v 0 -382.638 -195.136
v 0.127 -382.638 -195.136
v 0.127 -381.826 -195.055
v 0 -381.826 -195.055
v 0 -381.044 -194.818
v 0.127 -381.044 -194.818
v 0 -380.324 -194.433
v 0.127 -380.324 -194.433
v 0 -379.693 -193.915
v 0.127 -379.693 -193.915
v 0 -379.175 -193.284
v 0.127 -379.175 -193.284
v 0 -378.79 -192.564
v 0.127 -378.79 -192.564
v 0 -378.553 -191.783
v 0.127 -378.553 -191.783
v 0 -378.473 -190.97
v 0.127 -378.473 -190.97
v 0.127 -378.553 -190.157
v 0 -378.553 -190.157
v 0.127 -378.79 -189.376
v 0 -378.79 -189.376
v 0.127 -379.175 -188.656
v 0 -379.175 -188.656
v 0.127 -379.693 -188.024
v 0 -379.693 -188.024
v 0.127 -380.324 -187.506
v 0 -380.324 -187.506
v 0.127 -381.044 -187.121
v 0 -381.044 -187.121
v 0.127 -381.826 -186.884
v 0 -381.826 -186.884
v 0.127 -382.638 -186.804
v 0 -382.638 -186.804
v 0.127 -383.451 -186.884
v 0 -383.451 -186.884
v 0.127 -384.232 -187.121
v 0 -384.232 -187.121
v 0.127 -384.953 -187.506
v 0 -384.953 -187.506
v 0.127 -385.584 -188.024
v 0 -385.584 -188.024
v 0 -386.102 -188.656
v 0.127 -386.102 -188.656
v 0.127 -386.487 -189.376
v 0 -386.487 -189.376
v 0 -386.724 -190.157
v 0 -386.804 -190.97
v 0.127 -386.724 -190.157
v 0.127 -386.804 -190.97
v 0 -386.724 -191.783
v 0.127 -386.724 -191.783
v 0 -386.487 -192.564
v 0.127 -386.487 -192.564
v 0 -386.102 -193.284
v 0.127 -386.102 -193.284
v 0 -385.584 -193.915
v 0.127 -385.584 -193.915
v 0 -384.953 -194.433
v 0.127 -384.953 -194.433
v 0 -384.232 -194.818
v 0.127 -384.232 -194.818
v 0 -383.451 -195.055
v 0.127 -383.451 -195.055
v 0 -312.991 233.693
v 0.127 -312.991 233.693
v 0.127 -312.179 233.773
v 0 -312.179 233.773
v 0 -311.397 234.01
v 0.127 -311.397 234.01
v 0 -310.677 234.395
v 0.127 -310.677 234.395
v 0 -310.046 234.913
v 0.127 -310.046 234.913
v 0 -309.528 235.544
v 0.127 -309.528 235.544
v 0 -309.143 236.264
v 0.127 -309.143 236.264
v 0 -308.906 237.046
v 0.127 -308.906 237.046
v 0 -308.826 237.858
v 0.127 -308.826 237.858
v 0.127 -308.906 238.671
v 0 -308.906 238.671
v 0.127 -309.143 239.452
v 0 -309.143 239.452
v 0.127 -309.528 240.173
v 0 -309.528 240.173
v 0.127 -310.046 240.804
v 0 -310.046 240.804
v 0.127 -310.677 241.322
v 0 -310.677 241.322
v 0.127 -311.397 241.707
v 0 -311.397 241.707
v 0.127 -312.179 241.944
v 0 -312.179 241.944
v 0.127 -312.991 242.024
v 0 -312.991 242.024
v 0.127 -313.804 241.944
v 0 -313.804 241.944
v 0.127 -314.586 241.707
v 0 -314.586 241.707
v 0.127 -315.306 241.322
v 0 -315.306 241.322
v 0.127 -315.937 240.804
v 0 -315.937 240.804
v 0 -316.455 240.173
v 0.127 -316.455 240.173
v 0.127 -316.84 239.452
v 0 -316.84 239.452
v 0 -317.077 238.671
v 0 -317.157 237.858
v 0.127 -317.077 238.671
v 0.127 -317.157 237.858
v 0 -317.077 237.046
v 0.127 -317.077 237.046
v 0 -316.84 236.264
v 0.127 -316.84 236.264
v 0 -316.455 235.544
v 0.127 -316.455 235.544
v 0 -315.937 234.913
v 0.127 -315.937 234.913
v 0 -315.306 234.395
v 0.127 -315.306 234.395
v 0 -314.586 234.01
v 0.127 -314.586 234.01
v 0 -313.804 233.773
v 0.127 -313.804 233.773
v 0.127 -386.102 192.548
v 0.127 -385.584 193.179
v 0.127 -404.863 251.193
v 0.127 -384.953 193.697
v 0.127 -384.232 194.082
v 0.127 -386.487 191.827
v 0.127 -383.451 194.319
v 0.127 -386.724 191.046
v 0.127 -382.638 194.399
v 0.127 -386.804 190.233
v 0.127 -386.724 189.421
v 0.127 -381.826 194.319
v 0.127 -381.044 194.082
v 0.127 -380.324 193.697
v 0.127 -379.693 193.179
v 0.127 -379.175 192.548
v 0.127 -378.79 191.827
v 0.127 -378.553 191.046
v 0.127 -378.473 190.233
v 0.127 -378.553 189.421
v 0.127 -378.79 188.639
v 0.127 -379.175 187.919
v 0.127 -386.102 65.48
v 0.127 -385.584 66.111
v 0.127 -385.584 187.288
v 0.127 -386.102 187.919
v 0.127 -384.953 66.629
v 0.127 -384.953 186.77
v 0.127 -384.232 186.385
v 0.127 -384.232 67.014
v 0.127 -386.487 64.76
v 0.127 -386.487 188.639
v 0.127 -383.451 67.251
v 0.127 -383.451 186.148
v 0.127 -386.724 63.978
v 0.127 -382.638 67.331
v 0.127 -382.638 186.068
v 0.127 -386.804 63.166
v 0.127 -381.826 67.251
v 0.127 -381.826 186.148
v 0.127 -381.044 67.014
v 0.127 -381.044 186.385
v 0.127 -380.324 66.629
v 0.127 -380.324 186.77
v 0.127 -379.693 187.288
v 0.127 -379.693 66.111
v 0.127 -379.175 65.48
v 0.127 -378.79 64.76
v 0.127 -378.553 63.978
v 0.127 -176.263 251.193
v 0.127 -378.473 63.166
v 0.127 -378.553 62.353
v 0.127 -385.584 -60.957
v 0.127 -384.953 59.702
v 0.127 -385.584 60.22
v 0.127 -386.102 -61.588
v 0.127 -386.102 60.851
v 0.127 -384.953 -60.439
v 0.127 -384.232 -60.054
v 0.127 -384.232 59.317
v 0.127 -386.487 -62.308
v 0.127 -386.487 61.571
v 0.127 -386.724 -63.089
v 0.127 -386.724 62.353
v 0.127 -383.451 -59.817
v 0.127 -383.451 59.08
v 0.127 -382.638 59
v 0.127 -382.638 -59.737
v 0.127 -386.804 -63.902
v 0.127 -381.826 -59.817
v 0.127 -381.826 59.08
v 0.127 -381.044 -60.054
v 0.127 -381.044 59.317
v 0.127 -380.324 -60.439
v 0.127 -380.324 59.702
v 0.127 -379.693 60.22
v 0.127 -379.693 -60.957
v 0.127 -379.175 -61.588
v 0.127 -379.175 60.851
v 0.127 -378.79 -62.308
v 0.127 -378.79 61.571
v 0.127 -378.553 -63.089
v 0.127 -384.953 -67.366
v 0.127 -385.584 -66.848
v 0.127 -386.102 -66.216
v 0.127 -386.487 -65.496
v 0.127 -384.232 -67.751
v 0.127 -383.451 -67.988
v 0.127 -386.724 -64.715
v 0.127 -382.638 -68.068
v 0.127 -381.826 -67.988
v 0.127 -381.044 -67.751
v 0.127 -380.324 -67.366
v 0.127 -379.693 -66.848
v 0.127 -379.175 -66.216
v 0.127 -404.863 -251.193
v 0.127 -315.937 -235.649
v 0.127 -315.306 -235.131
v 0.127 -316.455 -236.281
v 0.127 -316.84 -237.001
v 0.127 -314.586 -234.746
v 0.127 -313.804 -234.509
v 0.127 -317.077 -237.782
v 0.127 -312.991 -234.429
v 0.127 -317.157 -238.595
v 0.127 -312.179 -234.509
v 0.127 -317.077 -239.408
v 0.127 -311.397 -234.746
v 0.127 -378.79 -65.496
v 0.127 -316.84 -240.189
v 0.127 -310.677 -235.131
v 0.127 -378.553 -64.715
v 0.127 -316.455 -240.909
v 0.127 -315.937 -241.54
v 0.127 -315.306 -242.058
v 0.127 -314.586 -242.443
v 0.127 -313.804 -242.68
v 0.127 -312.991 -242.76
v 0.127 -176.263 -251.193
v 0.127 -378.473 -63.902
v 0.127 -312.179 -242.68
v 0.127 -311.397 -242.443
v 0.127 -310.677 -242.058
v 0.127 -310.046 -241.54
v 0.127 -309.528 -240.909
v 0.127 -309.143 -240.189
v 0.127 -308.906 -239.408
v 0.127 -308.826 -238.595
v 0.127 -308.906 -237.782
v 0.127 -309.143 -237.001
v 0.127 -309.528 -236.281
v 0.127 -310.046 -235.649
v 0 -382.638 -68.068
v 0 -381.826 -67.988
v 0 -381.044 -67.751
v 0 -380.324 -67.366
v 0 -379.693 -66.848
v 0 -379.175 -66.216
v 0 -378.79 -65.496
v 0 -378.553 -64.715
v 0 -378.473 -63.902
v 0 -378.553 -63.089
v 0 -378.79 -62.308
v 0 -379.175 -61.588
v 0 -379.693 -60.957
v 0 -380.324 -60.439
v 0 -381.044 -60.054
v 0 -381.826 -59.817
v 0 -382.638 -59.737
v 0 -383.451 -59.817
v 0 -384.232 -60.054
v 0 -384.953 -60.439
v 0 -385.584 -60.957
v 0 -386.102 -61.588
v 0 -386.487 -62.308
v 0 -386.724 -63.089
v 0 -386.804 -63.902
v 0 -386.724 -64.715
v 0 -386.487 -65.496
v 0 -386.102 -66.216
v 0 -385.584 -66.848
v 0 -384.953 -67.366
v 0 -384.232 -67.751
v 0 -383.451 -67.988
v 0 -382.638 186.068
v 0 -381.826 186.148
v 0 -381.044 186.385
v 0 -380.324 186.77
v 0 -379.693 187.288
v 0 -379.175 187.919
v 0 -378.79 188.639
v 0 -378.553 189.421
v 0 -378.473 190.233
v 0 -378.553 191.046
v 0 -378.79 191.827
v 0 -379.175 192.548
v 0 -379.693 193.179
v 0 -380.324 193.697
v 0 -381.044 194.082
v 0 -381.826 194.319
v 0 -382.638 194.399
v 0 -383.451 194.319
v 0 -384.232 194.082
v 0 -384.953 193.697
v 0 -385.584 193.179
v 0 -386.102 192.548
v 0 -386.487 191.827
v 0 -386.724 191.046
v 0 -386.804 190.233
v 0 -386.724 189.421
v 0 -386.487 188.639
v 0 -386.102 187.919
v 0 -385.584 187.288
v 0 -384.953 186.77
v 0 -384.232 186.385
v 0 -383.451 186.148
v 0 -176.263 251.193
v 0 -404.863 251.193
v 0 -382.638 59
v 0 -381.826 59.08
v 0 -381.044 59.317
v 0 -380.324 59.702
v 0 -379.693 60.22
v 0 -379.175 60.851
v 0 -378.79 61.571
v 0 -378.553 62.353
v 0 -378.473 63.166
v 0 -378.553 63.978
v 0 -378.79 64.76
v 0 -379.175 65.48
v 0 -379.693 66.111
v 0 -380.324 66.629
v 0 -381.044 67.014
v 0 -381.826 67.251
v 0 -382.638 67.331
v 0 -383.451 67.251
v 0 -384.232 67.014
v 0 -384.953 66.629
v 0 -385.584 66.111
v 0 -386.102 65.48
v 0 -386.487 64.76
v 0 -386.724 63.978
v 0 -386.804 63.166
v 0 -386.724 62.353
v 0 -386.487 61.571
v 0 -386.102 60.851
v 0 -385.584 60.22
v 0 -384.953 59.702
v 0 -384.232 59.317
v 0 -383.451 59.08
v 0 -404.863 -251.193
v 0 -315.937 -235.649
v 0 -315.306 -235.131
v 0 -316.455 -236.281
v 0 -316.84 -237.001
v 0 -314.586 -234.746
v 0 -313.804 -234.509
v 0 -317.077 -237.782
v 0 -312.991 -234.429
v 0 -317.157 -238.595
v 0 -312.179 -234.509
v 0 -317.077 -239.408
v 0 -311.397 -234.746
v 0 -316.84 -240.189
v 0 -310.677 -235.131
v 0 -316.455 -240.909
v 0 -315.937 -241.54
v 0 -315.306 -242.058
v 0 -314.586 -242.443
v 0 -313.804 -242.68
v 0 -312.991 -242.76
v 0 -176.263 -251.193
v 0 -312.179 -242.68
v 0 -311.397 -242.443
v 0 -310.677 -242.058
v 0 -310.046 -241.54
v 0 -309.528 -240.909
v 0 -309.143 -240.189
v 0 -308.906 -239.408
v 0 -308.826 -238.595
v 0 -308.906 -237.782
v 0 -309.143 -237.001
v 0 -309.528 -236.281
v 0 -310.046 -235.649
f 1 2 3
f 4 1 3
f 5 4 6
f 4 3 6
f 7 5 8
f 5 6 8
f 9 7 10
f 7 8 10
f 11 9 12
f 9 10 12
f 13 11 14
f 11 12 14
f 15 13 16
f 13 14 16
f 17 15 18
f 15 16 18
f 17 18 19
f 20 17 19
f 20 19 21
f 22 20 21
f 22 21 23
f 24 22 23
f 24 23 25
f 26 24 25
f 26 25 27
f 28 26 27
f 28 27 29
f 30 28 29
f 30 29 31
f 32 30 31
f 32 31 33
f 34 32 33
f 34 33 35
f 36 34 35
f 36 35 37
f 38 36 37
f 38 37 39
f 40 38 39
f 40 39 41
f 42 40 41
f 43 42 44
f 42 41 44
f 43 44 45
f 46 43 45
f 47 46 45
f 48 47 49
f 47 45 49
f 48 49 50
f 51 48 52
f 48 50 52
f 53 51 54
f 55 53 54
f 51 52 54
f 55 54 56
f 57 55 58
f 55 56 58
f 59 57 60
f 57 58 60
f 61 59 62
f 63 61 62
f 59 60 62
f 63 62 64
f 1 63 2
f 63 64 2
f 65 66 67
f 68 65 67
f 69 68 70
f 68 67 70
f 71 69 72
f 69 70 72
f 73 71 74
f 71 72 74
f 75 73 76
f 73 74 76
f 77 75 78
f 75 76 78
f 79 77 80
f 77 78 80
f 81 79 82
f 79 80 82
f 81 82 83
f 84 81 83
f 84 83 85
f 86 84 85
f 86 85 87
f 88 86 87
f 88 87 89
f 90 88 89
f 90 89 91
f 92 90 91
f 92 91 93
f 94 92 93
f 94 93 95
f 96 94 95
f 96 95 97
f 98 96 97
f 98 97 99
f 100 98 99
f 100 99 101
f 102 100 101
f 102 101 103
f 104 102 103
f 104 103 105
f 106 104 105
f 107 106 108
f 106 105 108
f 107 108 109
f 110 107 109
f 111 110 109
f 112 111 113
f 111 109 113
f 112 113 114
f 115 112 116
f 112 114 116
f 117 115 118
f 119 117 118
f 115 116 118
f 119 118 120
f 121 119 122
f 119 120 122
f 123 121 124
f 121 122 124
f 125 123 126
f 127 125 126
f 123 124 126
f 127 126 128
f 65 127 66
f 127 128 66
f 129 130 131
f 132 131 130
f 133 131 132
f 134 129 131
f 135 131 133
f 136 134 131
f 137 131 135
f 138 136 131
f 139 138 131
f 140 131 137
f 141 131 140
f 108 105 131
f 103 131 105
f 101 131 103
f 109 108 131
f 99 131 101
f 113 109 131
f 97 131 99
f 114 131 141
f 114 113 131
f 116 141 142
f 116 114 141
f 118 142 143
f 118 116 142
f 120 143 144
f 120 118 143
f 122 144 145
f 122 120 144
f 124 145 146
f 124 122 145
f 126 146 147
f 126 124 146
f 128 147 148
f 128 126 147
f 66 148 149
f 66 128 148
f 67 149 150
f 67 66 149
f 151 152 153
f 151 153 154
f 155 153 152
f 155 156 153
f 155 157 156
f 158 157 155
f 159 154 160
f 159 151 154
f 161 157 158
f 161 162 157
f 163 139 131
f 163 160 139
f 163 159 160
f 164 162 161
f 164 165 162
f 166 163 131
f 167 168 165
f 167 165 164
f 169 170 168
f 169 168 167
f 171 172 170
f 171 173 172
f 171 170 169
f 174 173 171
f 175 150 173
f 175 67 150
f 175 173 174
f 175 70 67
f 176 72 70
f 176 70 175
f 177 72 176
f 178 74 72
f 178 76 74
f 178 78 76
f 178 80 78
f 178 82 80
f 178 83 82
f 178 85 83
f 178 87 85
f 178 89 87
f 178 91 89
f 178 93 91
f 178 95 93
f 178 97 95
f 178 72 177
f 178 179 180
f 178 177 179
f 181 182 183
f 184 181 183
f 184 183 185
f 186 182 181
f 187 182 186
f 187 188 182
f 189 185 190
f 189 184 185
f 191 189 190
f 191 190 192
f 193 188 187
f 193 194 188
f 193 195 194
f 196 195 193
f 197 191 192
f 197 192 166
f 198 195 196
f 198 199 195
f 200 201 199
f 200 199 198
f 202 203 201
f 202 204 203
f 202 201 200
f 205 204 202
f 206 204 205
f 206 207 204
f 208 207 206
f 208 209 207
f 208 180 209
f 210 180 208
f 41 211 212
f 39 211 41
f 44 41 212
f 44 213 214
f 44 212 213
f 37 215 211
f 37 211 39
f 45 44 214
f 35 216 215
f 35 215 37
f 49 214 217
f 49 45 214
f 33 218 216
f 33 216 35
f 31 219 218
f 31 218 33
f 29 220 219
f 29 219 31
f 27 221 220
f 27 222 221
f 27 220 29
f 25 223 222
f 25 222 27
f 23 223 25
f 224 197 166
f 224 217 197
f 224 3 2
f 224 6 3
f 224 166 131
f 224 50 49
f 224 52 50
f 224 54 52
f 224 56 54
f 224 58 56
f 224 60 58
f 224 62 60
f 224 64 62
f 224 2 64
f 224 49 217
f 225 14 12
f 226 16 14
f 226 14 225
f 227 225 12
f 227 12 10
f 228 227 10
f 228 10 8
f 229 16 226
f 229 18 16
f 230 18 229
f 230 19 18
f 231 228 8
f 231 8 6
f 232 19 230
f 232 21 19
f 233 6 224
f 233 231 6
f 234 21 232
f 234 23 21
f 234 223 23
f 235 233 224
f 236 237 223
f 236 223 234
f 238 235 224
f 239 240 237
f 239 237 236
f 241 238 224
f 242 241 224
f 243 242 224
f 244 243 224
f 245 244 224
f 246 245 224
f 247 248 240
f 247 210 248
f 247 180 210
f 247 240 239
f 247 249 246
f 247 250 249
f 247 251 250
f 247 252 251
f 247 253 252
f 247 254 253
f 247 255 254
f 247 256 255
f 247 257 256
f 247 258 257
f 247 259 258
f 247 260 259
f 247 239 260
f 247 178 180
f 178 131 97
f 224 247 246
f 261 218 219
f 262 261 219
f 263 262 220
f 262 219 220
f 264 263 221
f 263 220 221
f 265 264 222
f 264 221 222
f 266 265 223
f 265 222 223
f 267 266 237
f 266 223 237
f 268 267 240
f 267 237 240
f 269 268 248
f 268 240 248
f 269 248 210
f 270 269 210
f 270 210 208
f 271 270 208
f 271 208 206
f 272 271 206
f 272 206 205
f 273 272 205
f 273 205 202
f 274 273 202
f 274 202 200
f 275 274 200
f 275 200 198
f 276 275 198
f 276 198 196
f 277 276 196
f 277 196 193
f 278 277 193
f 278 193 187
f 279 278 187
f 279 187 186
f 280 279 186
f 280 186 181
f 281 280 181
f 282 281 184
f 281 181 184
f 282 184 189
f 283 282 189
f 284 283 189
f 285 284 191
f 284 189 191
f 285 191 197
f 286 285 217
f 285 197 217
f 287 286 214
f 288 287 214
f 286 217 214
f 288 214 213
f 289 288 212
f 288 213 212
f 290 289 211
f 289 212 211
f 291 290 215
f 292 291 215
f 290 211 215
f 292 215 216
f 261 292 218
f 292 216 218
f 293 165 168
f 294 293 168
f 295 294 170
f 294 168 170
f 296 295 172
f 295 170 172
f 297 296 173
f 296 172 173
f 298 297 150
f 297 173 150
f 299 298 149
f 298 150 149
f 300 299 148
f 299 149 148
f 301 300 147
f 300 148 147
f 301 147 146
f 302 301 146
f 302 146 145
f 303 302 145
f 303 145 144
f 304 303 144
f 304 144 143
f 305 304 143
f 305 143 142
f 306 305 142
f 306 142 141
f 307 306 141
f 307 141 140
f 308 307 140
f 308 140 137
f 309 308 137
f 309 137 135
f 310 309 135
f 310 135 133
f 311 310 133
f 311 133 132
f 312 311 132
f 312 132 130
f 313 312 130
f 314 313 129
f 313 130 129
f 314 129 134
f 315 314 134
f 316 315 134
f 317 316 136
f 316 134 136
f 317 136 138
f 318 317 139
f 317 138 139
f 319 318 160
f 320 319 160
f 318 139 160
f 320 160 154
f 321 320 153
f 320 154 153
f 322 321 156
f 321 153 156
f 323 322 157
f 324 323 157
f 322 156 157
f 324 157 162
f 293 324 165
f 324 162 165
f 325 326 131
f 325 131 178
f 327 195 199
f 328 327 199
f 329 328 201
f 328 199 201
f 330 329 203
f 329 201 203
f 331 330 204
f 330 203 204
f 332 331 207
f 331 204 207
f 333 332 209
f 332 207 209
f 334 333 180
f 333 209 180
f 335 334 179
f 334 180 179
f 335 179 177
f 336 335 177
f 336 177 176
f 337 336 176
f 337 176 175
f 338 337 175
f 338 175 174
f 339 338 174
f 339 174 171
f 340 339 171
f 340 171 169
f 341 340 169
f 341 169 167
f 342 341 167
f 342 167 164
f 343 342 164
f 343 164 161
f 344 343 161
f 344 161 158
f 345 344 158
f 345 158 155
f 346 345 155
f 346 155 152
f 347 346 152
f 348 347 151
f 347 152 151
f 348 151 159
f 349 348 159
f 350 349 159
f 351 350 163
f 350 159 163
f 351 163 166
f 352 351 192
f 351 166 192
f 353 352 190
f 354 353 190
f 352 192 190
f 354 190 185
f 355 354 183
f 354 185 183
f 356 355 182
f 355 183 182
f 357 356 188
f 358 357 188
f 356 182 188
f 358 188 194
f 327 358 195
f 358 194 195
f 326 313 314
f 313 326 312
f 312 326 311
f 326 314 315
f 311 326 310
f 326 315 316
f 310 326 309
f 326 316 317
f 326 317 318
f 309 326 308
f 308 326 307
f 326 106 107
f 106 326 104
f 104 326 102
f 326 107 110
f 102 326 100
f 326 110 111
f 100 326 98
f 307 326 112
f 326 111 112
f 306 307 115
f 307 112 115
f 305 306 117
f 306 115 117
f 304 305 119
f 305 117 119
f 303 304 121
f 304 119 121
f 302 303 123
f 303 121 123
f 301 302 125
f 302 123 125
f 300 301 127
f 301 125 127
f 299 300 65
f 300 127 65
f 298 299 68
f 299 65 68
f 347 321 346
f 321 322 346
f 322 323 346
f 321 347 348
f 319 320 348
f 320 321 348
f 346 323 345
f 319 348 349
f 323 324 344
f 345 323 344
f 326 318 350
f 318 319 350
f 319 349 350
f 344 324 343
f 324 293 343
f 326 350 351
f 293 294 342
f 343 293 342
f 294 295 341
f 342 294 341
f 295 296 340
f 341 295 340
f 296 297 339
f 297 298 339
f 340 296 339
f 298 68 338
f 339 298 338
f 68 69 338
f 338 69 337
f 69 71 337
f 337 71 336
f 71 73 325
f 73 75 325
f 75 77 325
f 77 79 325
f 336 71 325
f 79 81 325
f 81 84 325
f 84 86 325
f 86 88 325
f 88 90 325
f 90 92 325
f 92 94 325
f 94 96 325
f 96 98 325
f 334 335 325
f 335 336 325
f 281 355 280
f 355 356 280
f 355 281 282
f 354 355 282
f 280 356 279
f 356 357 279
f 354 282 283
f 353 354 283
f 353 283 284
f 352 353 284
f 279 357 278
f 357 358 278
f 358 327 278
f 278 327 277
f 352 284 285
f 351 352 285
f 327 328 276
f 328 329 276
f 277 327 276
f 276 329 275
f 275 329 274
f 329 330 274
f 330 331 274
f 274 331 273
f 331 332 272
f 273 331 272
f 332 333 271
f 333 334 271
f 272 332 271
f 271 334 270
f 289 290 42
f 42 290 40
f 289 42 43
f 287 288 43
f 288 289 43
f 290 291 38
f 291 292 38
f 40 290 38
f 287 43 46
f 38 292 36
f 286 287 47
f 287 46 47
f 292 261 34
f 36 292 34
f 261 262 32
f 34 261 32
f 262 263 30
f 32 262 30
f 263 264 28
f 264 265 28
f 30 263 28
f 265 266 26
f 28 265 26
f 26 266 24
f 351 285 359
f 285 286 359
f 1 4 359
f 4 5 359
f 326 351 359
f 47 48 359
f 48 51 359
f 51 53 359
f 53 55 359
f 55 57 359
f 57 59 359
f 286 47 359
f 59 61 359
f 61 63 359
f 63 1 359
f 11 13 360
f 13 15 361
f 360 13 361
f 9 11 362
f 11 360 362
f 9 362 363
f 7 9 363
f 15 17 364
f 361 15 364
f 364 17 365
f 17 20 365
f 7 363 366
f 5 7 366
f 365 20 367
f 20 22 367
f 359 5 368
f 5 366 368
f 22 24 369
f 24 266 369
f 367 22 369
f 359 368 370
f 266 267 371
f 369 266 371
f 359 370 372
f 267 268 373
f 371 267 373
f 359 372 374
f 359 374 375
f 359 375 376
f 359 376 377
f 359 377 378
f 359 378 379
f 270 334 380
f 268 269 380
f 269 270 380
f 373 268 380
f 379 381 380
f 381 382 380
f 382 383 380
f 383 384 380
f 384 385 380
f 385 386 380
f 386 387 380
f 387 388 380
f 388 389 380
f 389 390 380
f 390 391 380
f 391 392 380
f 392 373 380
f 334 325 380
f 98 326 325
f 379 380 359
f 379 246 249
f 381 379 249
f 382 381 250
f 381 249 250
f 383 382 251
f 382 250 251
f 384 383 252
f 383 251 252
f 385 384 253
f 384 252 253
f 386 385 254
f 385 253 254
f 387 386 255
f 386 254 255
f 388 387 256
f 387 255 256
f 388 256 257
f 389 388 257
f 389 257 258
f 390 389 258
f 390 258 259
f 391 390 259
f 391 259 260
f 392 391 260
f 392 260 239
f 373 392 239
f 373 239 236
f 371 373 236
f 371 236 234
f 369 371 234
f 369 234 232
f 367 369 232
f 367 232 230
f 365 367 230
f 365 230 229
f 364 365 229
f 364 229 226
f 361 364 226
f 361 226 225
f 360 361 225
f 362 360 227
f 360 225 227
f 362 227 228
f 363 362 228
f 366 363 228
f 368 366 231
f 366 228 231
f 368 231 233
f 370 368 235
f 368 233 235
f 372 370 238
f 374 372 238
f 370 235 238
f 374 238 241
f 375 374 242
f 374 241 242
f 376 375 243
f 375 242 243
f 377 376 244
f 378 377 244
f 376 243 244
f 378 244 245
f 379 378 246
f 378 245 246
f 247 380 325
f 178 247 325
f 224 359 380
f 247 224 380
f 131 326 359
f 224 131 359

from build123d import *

# Parameters (mm, degrees)
SKETCH1_W                 = 502.3866
SKETCH1_H                 = 809.7266
SIDEPANEL_DEPTH           = 0.127
SKETCH2_R                 = 4.1656
TOPBOTTOMHOLEMASTER_DEPTH = 1.127
LPATTERN1_COUNT           = 4
LPATTERN1_PITCH           = 127.067733333
SKETCH3_R                 = 4.1656
REARHOLESMASTER_DEPTH     = 1.127
LPATTERN2_COUNT           = 4
LPATTERN2_PITCH           = 211.7344
SKETCH4_W                 = 502.3866
SKETCH4_H                 = 581.1266
CUT_EXTRUDE1_DEPTH        = 1.127


with BuildPart() as part:
    # Sketch1 → SidePanel (new body)
    with BuildSketch(Plane(origin=(0, 0, 0), x_dir=(0, 0, -1), z_dir=(1, 0, 0))):
        Rectangle(SKETCH1_W, SKETCH1_H)
    extrude(amount=SIDEPANEL_DEPTH)

    # Sketch2 → TopBottomHoleMaster (cut, through all)
    with BuildSketch(Plane(origin=(0.127, 0, 0), x_dir=(0, 0, -1), z_dir=(1, 0, 0))):
        with Locations((190.9699, -382.6383)):
            Circle(SKETCH2_R)
    topbottomholemaster = extrude(amount=-TOPBOTTOMHOLEMASTER_DEPTH, mode=Mode.SUBTRACT)

    # LPattern1: TopBottomHoleMaster ×4
    with Locations(*[(0, 0, i * LPATTERN1_PITCH) for i in range(1, LPATTERN1_COUNT)]):
        add(topbottomholemaster, mode=Mode.SUBTRACT)

    # Sketch3 → RearHolesMaster (cut, through all)
    with BuildSketch(Plane(origin=(0.127, 0, 0), x_dir=(0, 0, -1), z_dir=(1, 0, 0))):
        with Locations((-237.8583, 322.2117)):
            Circle(SKETCH3_R)
        with Locations((238.5949, 322.2117)):
            Circle(SKETCH3_R)
    rearholesmaster = extrude(amount=-REARHOLESMASTER_DEPTH, mode=Mode.SUBTRACT)

    # LPattern2: RearHolesMaster ×4
    with Locations(*[(0, -i * LPATTERN2_PITCH, 0) for i in range(1, LPATTERN2_COUNT)]):
        add(rearholesmaster, mode=Mode.SUBTRACT)

    # Sketch4 → Cut-Extrude1 (cut, through all)
    with BuildSketch(Plane.ZY):
        with Locations((0, 114.3)):
            Rectangle(SKETCH4_W, SKETCH4_H)
    extrude(amount=-CUT_EXTRUDE1_DEPTH, mode=Mode.SUBTRACT)


solid = part.part
